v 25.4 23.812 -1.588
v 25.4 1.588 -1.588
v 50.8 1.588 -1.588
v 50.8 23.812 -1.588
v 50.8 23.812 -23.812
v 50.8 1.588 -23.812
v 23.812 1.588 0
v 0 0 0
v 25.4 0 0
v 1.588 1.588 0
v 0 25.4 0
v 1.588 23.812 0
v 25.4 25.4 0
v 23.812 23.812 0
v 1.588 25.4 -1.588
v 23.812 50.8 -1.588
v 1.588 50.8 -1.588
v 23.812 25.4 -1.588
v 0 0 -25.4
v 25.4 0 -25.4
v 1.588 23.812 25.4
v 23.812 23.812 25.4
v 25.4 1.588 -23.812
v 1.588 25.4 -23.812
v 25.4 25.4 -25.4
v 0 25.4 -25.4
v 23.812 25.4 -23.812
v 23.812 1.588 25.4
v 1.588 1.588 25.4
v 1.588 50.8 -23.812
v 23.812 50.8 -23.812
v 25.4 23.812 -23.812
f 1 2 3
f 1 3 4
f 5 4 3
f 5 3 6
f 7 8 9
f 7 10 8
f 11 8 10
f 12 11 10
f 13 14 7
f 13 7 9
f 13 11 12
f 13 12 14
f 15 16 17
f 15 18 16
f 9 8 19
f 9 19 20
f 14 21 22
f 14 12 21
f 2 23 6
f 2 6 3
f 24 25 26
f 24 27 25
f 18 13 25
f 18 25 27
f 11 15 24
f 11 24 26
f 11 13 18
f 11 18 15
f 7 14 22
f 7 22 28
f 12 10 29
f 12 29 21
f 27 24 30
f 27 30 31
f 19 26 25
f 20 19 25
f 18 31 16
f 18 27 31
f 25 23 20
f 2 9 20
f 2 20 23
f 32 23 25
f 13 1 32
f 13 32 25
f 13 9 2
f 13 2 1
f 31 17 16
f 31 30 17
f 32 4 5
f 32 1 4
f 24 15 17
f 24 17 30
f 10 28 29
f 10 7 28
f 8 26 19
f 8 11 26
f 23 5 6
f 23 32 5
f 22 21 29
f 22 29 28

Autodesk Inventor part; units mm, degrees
ref_plane "YZ Plane" through (0, 0, 0) normal (1, 0, 0) x (0, 1, 0)
ref_plane "XZ Plane" through (0, 0, 0) normal (0, 1, 0) x (-1, 0, 0)
ref_plane "XY Plane" through (0, 0, 0) normal (0, 0, 1) x (1, 0, 0)
sketch "Sketch1" plane through (0, 0, 0) normal (0, 0, 1) x (1, 0, 0)
  line L0 (0, 0) -> (25.4, 0)
  line L1 (25.4, 0) -> (25.4, 25.4)
  line L2 (25.4, 25.4) -> (0, 25.4)
  line L3 (0, 25.4) -> (0, 0)
  line L4 (1.5875, 23.8125) -> (23.8125, 23.8125)
  line L5 (23.8125, 23.8125) -> (23.8125, 1.5875)
  line L6 (23.8125, 1.5875) -> (1.5875, 1.5875)
  line L7 (1.5875, 1.5875) -> (1.5875, 23.8125)
  dimension "d0" = 25.4
  dimension "d1" = 25.4
  dimension "d4" = 1.5875
extrude "Extrusion1" add sketch "Sketch1" against normal blind 25.4 contours L3 L2 L1 L0 | L4 L5 L6 L7
extrude "Extrusion2" add sketch "Sketch1" along normal blind 25.4 contours L4 L5 L6 L7
sketch "Sketch2" plane through (25.4, 0, 0) normal (1, 0, 0) x (0, 0, -1)
  line L0 (25.4, 0) -> (25.4, 25.4) projected
  line L1 (0, 25.4) -> (25.4, 25.4) projected
  line L2 (0, 0) -> (0, 25.4) projected
  line L3 (0, 0) -> (25.4, 0) projected
  line L4 (23.8125, 23.8125) -> (23.8125, 1.5875)
  line L5 (23.8125, 1.5875) -> (1.5875, 1.5875)
  line L6 (1.5875, 1.5875) -> (1.5875, 23.8125)
  line L7 (1.5875, 23.8125) -> (23.8125, 23.8125)
  dimension "d8" = 1.5875
sketch "Sketch3" plane through (0, 25.4, 0) normal (0, 1, 0) x (1, 0, 0)
  line L0 (25.4, 25.4) -> (0, 25.4) projected
  line L1 (0, 0) -> (0, 25.4) projected
  line L2 (25.4, 0) -> (0, 0) projected
  line L3 (25.4, 0) -> (25.4, 25.4) projected
  line L4 (1.5875, 23.8125) -> (23.8125, 23.8125)
  line L5 (23.8125, 23.8125) -> (23.8125, 1.5875)
  line L6 (23.8125, 1.5875) -> (1.5875, 1.5875)
  line L7 (1.5875, 1.5875) -> (1.5875, 23.8125)
  dimension "d9" = 1.5875
extrude "Extrusion3" add sketch "Sketch2" along normal blind 25.4 contours L4 L5 L6 L7
extrude "Extrusion4" add sketch "Sketch3" along normal blind 25.4 contours L4 L5 L6 L7
properties part number "3-way corner"
